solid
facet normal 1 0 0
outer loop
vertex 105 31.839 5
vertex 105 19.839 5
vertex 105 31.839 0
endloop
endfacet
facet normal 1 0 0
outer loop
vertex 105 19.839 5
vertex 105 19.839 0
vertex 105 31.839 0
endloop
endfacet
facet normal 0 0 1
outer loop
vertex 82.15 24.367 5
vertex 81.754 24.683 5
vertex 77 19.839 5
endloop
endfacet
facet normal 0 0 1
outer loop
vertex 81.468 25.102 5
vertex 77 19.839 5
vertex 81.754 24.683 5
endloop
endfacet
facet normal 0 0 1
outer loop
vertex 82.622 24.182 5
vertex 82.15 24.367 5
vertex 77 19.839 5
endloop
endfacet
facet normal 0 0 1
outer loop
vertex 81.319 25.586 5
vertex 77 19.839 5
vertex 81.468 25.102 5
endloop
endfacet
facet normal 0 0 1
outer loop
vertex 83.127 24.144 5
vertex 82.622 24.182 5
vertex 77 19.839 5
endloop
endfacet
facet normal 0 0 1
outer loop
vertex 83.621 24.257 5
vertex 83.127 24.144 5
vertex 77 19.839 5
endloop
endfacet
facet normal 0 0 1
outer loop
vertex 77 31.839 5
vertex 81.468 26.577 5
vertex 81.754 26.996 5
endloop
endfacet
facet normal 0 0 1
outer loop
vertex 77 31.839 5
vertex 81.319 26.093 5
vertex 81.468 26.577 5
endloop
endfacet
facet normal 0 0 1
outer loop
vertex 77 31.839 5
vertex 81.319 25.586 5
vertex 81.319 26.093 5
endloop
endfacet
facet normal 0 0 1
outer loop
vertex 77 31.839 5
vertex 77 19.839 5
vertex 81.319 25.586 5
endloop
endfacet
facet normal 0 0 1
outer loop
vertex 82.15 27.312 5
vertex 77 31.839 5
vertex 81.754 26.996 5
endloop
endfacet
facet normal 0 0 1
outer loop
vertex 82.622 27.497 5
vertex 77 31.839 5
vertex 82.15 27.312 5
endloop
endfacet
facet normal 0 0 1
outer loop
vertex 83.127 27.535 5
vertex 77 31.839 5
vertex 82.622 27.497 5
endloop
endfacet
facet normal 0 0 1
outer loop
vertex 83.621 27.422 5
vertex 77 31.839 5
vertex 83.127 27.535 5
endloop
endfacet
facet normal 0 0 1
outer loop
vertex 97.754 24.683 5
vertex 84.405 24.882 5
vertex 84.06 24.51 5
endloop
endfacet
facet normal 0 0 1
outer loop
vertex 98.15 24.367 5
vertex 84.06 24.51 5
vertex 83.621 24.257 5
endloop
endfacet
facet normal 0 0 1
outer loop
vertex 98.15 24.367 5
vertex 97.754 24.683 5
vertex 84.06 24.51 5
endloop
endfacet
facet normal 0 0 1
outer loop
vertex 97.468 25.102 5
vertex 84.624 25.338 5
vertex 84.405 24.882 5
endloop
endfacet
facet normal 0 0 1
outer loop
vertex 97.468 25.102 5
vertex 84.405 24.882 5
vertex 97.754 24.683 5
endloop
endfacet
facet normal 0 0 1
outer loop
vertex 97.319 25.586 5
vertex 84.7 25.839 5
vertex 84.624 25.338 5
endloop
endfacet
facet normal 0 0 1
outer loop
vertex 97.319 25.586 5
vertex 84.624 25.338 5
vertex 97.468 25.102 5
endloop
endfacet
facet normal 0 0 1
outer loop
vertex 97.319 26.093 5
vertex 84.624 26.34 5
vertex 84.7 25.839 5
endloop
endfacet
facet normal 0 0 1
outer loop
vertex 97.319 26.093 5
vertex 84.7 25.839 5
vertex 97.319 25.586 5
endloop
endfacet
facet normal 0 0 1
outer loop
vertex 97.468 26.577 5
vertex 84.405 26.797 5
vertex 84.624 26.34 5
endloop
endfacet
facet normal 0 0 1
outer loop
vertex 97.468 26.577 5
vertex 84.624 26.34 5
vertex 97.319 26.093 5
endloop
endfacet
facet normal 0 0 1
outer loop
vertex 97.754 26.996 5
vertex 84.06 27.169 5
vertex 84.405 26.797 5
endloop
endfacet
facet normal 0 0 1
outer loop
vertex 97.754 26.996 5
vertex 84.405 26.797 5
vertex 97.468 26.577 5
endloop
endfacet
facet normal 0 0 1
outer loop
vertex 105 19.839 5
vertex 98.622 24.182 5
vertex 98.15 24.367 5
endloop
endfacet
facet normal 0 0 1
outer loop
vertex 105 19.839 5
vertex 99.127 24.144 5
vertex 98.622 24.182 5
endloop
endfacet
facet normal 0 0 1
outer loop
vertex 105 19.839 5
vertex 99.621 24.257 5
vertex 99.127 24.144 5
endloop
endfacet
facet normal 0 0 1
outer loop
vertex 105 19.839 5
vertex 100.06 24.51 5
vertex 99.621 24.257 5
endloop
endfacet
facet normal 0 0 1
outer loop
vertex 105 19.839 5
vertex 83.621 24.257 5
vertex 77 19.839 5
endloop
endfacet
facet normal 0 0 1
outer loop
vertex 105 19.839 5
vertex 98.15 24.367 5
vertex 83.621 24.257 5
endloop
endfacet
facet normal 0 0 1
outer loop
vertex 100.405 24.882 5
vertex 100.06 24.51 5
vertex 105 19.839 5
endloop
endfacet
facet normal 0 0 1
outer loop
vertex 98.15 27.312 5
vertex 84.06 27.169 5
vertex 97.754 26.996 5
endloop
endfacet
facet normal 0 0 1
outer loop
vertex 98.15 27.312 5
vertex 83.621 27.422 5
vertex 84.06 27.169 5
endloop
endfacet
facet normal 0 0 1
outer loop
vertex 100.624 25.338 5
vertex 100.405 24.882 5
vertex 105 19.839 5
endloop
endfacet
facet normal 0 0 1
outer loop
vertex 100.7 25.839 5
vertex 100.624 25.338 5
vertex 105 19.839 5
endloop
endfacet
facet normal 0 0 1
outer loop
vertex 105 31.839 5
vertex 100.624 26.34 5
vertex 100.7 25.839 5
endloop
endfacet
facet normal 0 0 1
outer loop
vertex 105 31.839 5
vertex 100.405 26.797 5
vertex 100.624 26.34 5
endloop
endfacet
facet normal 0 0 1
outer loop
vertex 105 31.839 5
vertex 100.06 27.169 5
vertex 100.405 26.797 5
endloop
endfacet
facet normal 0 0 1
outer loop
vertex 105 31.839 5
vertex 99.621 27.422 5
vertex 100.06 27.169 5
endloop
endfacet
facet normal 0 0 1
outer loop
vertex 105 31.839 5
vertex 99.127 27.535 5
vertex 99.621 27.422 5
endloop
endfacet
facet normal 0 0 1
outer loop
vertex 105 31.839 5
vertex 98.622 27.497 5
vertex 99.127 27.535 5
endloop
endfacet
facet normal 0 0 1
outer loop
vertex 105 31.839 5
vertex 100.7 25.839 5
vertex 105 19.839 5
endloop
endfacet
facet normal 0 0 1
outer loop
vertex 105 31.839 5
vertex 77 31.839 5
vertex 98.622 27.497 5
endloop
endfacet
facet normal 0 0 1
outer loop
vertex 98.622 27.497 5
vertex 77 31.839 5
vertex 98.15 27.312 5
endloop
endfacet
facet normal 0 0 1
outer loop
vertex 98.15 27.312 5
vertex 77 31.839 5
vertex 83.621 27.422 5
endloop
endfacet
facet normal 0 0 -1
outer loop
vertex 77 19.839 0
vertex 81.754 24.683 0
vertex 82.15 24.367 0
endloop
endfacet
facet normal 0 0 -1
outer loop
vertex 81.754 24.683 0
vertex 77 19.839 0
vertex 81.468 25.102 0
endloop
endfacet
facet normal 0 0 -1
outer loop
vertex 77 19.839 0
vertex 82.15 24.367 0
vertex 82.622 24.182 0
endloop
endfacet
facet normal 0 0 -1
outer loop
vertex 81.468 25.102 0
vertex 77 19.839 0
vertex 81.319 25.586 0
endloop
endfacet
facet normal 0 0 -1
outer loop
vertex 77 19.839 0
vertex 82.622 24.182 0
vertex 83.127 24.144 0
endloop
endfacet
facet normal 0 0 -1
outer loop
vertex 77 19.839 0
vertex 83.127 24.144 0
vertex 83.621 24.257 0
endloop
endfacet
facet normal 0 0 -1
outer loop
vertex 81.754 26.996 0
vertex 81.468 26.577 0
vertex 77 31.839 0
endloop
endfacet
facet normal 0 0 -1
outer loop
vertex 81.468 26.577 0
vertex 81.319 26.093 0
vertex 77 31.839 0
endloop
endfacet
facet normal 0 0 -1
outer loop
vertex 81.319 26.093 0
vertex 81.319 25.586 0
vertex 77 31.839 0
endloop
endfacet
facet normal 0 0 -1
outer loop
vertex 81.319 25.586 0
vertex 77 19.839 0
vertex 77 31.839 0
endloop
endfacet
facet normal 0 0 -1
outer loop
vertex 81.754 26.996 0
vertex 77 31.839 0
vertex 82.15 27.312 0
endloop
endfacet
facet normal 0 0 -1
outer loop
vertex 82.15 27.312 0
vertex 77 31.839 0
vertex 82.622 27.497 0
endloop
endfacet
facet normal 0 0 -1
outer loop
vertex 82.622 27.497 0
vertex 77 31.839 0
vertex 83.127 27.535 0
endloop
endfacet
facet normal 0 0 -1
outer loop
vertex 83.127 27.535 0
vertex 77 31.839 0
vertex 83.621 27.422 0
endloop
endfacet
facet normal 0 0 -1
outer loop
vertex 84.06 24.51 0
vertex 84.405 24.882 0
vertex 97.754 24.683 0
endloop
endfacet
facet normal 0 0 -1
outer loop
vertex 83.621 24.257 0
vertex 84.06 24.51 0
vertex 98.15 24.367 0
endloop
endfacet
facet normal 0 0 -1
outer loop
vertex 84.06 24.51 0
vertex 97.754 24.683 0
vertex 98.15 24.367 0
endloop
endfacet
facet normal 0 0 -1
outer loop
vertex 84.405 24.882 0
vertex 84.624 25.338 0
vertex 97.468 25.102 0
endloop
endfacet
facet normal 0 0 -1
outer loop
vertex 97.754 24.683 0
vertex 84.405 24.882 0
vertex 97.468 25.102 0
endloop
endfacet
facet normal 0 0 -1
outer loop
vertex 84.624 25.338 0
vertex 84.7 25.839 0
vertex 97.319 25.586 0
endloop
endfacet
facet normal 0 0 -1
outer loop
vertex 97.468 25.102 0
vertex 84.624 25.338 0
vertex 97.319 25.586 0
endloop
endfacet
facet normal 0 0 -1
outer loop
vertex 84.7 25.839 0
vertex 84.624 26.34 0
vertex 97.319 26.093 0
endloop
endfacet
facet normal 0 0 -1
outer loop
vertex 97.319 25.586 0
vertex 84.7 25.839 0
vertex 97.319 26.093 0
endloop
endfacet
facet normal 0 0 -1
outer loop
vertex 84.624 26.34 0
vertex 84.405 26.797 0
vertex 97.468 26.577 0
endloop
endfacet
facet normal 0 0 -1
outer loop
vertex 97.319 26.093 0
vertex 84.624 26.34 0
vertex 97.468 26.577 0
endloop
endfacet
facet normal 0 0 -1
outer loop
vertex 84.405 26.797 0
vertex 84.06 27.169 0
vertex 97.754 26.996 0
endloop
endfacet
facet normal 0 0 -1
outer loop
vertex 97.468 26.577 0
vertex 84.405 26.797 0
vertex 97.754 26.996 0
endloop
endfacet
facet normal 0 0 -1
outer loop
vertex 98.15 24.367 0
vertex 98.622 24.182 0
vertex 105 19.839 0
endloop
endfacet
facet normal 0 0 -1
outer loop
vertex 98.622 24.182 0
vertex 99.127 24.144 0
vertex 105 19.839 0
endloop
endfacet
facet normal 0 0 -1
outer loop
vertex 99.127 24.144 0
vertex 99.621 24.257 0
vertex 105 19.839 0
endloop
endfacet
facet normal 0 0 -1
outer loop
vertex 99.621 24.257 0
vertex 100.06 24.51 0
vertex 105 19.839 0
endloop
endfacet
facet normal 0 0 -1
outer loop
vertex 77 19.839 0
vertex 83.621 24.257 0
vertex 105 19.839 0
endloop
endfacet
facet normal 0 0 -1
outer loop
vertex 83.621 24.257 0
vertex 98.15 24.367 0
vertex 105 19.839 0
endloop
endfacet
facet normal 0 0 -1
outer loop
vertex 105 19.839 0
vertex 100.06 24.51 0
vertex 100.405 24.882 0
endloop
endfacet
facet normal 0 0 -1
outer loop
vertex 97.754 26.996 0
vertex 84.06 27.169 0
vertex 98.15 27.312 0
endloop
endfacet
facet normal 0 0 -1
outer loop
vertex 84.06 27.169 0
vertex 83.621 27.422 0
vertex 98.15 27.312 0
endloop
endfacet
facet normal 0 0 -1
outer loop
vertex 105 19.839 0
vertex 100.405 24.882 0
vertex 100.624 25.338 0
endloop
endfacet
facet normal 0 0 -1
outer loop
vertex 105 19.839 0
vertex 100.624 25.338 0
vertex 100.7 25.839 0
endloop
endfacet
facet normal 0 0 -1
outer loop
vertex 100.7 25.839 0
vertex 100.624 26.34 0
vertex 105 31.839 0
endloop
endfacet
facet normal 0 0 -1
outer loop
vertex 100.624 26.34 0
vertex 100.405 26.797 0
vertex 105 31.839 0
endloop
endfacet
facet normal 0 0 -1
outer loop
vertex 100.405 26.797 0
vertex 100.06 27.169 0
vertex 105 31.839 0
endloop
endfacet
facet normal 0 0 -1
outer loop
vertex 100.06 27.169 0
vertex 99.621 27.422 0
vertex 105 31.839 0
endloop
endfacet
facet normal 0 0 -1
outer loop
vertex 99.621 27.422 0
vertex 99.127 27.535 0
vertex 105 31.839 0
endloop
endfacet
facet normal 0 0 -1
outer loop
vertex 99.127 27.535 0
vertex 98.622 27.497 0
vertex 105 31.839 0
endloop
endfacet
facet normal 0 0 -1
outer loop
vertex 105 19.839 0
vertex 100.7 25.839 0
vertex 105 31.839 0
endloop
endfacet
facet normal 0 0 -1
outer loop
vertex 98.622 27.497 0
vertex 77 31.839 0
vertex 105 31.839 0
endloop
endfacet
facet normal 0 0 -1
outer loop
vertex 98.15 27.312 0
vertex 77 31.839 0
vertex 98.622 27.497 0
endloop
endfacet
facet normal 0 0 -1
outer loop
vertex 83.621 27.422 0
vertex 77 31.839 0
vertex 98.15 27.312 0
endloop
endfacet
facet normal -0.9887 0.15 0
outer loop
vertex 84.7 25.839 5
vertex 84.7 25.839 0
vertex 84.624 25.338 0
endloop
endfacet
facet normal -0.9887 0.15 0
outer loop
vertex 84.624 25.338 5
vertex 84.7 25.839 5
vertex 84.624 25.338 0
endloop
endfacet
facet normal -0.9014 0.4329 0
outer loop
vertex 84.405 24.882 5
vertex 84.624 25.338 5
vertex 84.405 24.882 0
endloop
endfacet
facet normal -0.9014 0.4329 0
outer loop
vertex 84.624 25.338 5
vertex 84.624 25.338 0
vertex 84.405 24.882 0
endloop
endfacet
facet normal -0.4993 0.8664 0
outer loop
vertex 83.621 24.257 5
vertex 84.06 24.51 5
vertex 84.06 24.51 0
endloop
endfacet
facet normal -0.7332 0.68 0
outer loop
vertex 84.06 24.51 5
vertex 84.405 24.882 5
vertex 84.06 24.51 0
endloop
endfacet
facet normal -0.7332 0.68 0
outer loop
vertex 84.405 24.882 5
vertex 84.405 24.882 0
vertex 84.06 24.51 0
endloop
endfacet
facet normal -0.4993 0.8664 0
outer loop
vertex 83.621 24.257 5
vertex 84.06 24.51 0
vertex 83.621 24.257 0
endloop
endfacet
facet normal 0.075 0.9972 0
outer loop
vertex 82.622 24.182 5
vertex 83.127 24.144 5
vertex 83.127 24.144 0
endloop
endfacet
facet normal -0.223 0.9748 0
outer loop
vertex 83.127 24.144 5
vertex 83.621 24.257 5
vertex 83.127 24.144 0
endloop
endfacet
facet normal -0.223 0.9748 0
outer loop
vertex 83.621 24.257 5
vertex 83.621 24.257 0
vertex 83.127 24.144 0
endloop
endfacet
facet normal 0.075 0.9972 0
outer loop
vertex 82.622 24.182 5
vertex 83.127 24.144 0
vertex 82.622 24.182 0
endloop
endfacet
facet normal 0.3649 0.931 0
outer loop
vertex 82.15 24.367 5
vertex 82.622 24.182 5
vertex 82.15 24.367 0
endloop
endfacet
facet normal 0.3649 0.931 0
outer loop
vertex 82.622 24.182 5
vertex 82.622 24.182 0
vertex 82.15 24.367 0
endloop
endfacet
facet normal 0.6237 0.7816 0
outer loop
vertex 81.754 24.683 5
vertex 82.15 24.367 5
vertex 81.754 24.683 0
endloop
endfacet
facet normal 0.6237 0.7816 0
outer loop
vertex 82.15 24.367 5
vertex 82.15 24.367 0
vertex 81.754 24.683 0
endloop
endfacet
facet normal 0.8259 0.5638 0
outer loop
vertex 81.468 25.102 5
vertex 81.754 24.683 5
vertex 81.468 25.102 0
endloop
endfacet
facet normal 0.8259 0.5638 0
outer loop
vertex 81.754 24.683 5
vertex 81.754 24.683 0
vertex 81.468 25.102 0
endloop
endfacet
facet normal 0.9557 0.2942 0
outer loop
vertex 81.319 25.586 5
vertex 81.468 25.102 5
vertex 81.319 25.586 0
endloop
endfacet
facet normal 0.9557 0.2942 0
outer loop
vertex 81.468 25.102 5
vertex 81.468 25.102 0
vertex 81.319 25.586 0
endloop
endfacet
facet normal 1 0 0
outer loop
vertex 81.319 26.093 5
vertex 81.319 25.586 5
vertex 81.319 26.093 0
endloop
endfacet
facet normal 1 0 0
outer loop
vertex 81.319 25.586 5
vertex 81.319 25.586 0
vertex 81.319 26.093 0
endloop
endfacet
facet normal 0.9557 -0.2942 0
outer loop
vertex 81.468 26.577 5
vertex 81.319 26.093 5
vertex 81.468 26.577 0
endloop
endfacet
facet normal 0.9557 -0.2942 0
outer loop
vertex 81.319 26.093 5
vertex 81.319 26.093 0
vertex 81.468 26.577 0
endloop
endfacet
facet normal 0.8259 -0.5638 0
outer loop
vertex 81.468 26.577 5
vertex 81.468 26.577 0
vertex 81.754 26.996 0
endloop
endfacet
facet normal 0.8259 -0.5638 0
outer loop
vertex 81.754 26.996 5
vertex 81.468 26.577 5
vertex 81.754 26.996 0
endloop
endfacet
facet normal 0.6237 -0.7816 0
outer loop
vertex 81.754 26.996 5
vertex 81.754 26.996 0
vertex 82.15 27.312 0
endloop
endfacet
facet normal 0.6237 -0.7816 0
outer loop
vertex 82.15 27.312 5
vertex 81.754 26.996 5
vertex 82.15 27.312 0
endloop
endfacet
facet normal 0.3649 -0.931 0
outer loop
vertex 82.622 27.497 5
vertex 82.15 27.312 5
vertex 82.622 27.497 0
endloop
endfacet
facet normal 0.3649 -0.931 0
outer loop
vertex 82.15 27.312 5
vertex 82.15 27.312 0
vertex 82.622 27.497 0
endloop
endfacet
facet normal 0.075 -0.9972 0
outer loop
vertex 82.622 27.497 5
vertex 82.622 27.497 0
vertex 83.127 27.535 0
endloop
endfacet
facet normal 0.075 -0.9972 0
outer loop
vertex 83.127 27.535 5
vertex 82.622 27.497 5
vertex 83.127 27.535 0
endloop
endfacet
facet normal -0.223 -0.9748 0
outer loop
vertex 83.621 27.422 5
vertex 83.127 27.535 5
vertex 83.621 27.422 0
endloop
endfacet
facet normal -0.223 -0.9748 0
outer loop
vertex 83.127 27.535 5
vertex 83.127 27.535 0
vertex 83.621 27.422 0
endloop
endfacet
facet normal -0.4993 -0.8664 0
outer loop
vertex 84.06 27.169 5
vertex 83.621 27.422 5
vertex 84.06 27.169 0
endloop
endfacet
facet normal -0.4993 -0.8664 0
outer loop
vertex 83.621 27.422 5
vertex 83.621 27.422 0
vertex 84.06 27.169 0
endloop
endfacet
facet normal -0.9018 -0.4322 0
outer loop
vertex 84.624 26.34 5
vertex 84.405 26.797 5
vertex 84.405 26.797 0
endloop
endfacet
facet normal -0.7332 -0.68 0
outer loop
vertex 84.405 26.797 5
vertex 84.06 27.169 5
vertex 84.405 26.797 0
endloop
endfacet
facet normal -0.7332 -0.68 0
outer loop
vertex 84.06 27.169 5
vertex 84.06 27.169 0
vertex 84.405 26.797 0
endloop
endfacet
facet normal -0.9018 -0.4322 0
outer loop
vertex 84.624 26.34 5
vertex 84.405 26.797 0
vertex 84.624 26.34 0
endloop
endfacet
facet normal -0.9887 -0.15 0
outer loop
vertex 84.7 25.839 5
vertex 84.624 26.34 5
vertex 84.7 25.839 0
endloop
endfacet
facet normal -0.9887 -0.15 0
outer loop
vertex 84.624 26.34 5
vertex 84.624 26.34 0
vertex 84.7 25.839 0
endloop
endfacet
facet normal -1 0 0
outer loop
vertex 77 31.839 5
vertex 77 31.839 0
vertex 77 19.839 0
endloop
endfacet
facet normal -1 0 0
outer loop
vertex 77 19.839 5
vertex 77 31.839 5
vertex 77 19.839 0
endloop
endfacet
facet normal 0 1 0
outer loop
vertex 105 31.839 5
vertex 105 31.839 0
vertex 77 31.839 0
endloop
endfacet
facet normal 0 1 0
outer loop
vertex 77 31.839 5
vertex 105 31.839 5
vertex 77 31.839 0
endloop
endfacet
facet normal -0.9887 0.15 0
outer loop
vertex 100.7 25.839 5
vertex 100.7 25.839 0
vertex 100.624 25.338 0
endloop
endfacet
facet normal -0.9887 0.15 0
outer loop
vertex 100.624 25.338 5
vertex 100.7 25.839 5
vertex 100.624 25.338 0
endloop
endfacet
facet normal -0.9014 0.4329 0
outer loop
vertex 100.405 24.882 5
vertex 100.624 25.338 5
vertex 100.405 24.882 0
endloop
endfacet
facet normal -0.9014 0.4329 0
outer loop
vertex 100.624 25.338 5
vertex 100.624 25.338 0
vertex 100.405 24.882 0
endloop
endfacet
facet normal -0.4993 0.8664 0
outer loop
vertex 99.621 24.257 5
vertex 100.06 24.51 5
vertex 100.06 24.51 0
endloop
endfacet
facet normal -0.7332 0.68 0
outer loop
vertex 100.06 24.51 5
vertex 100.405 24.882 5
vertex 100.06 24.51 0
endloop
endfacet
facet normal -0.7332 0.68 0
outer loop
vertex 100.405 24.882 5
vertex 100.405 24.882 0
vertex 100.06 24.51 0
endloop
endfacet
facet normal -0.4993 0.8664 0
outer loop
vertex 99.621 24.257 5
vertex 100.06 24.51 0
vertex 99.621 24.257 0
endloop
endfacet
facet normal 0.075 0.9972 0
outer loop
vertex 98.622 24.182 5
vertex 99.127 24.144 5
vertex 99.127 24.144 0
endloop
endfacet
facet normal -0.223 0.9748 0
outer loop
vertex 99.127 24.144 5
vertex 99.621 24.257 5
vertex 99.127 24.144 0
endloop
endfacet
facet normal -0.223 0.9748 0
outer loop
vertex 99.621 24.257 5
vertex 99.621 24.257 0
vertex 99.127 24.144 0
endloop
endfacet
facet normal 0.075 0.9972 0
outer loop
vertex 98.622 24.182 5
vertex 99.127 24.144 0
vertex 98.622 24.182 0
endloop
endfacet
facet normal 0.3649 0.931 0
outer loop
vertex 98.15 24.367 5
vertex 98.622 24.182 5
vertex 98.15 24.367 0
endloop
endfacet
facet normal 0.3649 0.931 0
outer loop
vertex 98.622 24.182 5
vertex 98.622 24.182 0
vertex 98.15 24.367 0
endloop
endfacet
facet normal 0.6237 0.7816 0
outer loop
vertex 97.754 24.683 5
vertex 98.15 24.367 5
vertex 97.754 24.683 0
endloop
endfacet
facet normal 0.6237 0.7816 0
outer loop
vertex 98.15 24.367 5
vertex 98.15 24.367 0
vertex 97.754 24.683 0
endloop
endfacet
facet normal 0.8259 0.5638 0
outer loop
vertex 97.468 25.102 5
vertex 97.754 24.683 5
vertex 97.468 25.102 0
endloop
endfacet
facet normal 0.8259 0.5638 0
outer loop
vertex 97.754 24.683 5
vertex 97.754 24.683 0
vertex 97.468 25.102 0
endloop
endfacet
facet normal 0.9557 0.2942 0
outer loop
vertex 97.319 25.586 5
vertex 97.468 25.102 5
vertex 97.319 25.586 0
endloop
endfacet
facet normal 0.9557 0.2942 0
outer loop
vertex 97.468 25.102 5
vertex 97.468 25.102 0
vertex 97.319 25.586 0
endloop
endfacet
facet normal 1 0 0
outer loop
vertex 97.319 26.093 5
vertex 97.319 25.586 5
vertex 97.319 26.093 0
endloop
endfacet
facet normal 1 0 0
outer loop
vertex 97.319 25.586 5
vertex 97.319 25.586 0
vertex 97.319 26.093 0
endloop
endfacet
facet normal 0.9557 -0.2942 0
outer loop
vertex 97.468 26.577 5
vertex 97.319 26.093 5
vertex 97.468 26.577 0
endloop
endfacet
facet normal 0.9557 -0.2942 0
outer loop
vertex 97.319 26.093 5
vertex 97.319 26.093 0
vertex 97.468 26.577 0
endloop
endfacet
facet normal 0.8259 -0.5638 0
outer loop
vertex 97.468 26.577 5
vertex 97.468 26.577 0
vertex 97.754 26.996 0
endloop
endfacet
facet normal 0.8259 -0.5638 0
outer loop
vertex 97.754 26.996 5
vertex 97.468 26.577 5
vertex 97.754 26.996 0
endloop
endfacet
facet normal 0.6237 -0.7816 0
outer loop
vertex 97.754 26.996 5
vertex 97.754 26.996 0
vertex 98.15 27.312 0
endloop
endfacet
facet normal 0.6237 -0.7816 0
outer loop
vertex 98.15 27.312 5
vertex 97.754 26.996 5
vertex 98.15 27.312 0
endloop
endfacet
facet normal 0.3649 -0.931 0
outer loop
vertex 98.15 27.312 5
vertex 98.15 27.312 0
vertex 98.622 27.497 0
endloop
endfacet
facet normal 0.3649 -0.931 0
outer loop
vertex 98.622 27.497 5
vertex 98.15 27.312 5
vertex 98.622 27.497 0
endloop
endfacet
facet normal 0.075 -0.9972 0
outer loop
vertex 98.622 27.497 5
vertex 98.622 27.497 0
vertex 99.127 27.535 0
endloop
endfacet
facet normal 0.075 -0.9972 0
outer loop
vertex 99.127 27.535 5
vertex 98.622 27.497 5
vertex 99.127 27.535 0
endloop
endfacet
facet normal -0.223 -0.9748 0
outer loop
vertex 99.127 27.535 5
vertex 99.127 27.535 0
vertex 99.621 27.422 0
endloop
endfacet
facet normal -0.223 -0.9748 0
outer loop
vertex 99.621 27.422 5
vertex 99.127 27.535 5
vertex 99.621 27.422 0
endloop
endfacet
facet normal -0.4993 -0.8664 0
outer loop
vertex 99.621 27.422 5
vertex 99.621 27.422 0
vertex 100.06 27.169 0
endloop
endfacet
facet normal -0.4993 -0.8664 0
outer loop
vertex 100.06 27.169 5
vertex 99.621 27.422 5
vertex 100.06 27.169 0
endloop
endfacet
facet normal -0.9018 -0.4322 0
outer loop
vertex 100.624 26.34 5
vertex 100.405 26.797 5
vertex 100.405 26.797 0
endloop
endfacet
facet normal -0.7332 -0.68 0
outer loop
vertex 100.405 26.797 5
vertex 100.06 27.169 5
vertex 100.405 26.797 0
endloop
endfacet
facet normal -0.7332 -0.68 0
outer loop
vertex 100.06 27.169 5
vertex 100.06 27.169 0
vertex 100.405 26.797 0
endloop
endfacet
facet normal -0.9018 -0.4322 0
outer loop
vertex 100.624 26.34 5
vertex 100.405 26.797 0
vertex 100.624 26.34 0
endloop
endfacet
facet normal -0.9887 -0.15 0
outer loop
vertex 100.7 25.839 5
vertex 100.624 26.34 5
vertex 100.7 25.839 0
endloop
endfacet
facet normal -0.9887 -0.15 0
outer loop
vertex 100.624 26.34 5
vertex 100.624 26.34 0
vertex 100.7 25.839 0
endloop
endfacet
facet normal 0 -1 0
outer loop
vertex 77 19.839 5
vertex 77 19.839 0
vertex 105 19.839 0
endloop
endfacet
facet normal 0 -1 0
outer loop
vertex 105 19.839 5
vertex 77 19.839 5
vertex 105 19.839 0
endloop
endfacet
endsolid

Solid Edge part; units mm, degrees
sketch "Sketch1" plane through (0, 0, 0) normal (0, 0, 1) x (1, 0, 0)
  circle A0 centre (99, 25.8394) radius 1.7
  line L0 (77, 19.8394) -> (105, 19.8394)
  line L1 (105, 19.8394) -> (105, 31.8394)
  line L2 (105, 31.8394) -> (77, 31.8394)
  line L3 (77, 31.8394) -> (77, 19.8394)
  circle A1 centre (83, 25.8394) radius 1.7
  dimension "D1" = 12
  dimension "D2" = 6
  dimension "D3" = 6
  dimension "D4" = 28
extrude "Protrusion1" add sketch "Sketch1" along normal blind 5
properties material "ABS Plastic, high impact"
